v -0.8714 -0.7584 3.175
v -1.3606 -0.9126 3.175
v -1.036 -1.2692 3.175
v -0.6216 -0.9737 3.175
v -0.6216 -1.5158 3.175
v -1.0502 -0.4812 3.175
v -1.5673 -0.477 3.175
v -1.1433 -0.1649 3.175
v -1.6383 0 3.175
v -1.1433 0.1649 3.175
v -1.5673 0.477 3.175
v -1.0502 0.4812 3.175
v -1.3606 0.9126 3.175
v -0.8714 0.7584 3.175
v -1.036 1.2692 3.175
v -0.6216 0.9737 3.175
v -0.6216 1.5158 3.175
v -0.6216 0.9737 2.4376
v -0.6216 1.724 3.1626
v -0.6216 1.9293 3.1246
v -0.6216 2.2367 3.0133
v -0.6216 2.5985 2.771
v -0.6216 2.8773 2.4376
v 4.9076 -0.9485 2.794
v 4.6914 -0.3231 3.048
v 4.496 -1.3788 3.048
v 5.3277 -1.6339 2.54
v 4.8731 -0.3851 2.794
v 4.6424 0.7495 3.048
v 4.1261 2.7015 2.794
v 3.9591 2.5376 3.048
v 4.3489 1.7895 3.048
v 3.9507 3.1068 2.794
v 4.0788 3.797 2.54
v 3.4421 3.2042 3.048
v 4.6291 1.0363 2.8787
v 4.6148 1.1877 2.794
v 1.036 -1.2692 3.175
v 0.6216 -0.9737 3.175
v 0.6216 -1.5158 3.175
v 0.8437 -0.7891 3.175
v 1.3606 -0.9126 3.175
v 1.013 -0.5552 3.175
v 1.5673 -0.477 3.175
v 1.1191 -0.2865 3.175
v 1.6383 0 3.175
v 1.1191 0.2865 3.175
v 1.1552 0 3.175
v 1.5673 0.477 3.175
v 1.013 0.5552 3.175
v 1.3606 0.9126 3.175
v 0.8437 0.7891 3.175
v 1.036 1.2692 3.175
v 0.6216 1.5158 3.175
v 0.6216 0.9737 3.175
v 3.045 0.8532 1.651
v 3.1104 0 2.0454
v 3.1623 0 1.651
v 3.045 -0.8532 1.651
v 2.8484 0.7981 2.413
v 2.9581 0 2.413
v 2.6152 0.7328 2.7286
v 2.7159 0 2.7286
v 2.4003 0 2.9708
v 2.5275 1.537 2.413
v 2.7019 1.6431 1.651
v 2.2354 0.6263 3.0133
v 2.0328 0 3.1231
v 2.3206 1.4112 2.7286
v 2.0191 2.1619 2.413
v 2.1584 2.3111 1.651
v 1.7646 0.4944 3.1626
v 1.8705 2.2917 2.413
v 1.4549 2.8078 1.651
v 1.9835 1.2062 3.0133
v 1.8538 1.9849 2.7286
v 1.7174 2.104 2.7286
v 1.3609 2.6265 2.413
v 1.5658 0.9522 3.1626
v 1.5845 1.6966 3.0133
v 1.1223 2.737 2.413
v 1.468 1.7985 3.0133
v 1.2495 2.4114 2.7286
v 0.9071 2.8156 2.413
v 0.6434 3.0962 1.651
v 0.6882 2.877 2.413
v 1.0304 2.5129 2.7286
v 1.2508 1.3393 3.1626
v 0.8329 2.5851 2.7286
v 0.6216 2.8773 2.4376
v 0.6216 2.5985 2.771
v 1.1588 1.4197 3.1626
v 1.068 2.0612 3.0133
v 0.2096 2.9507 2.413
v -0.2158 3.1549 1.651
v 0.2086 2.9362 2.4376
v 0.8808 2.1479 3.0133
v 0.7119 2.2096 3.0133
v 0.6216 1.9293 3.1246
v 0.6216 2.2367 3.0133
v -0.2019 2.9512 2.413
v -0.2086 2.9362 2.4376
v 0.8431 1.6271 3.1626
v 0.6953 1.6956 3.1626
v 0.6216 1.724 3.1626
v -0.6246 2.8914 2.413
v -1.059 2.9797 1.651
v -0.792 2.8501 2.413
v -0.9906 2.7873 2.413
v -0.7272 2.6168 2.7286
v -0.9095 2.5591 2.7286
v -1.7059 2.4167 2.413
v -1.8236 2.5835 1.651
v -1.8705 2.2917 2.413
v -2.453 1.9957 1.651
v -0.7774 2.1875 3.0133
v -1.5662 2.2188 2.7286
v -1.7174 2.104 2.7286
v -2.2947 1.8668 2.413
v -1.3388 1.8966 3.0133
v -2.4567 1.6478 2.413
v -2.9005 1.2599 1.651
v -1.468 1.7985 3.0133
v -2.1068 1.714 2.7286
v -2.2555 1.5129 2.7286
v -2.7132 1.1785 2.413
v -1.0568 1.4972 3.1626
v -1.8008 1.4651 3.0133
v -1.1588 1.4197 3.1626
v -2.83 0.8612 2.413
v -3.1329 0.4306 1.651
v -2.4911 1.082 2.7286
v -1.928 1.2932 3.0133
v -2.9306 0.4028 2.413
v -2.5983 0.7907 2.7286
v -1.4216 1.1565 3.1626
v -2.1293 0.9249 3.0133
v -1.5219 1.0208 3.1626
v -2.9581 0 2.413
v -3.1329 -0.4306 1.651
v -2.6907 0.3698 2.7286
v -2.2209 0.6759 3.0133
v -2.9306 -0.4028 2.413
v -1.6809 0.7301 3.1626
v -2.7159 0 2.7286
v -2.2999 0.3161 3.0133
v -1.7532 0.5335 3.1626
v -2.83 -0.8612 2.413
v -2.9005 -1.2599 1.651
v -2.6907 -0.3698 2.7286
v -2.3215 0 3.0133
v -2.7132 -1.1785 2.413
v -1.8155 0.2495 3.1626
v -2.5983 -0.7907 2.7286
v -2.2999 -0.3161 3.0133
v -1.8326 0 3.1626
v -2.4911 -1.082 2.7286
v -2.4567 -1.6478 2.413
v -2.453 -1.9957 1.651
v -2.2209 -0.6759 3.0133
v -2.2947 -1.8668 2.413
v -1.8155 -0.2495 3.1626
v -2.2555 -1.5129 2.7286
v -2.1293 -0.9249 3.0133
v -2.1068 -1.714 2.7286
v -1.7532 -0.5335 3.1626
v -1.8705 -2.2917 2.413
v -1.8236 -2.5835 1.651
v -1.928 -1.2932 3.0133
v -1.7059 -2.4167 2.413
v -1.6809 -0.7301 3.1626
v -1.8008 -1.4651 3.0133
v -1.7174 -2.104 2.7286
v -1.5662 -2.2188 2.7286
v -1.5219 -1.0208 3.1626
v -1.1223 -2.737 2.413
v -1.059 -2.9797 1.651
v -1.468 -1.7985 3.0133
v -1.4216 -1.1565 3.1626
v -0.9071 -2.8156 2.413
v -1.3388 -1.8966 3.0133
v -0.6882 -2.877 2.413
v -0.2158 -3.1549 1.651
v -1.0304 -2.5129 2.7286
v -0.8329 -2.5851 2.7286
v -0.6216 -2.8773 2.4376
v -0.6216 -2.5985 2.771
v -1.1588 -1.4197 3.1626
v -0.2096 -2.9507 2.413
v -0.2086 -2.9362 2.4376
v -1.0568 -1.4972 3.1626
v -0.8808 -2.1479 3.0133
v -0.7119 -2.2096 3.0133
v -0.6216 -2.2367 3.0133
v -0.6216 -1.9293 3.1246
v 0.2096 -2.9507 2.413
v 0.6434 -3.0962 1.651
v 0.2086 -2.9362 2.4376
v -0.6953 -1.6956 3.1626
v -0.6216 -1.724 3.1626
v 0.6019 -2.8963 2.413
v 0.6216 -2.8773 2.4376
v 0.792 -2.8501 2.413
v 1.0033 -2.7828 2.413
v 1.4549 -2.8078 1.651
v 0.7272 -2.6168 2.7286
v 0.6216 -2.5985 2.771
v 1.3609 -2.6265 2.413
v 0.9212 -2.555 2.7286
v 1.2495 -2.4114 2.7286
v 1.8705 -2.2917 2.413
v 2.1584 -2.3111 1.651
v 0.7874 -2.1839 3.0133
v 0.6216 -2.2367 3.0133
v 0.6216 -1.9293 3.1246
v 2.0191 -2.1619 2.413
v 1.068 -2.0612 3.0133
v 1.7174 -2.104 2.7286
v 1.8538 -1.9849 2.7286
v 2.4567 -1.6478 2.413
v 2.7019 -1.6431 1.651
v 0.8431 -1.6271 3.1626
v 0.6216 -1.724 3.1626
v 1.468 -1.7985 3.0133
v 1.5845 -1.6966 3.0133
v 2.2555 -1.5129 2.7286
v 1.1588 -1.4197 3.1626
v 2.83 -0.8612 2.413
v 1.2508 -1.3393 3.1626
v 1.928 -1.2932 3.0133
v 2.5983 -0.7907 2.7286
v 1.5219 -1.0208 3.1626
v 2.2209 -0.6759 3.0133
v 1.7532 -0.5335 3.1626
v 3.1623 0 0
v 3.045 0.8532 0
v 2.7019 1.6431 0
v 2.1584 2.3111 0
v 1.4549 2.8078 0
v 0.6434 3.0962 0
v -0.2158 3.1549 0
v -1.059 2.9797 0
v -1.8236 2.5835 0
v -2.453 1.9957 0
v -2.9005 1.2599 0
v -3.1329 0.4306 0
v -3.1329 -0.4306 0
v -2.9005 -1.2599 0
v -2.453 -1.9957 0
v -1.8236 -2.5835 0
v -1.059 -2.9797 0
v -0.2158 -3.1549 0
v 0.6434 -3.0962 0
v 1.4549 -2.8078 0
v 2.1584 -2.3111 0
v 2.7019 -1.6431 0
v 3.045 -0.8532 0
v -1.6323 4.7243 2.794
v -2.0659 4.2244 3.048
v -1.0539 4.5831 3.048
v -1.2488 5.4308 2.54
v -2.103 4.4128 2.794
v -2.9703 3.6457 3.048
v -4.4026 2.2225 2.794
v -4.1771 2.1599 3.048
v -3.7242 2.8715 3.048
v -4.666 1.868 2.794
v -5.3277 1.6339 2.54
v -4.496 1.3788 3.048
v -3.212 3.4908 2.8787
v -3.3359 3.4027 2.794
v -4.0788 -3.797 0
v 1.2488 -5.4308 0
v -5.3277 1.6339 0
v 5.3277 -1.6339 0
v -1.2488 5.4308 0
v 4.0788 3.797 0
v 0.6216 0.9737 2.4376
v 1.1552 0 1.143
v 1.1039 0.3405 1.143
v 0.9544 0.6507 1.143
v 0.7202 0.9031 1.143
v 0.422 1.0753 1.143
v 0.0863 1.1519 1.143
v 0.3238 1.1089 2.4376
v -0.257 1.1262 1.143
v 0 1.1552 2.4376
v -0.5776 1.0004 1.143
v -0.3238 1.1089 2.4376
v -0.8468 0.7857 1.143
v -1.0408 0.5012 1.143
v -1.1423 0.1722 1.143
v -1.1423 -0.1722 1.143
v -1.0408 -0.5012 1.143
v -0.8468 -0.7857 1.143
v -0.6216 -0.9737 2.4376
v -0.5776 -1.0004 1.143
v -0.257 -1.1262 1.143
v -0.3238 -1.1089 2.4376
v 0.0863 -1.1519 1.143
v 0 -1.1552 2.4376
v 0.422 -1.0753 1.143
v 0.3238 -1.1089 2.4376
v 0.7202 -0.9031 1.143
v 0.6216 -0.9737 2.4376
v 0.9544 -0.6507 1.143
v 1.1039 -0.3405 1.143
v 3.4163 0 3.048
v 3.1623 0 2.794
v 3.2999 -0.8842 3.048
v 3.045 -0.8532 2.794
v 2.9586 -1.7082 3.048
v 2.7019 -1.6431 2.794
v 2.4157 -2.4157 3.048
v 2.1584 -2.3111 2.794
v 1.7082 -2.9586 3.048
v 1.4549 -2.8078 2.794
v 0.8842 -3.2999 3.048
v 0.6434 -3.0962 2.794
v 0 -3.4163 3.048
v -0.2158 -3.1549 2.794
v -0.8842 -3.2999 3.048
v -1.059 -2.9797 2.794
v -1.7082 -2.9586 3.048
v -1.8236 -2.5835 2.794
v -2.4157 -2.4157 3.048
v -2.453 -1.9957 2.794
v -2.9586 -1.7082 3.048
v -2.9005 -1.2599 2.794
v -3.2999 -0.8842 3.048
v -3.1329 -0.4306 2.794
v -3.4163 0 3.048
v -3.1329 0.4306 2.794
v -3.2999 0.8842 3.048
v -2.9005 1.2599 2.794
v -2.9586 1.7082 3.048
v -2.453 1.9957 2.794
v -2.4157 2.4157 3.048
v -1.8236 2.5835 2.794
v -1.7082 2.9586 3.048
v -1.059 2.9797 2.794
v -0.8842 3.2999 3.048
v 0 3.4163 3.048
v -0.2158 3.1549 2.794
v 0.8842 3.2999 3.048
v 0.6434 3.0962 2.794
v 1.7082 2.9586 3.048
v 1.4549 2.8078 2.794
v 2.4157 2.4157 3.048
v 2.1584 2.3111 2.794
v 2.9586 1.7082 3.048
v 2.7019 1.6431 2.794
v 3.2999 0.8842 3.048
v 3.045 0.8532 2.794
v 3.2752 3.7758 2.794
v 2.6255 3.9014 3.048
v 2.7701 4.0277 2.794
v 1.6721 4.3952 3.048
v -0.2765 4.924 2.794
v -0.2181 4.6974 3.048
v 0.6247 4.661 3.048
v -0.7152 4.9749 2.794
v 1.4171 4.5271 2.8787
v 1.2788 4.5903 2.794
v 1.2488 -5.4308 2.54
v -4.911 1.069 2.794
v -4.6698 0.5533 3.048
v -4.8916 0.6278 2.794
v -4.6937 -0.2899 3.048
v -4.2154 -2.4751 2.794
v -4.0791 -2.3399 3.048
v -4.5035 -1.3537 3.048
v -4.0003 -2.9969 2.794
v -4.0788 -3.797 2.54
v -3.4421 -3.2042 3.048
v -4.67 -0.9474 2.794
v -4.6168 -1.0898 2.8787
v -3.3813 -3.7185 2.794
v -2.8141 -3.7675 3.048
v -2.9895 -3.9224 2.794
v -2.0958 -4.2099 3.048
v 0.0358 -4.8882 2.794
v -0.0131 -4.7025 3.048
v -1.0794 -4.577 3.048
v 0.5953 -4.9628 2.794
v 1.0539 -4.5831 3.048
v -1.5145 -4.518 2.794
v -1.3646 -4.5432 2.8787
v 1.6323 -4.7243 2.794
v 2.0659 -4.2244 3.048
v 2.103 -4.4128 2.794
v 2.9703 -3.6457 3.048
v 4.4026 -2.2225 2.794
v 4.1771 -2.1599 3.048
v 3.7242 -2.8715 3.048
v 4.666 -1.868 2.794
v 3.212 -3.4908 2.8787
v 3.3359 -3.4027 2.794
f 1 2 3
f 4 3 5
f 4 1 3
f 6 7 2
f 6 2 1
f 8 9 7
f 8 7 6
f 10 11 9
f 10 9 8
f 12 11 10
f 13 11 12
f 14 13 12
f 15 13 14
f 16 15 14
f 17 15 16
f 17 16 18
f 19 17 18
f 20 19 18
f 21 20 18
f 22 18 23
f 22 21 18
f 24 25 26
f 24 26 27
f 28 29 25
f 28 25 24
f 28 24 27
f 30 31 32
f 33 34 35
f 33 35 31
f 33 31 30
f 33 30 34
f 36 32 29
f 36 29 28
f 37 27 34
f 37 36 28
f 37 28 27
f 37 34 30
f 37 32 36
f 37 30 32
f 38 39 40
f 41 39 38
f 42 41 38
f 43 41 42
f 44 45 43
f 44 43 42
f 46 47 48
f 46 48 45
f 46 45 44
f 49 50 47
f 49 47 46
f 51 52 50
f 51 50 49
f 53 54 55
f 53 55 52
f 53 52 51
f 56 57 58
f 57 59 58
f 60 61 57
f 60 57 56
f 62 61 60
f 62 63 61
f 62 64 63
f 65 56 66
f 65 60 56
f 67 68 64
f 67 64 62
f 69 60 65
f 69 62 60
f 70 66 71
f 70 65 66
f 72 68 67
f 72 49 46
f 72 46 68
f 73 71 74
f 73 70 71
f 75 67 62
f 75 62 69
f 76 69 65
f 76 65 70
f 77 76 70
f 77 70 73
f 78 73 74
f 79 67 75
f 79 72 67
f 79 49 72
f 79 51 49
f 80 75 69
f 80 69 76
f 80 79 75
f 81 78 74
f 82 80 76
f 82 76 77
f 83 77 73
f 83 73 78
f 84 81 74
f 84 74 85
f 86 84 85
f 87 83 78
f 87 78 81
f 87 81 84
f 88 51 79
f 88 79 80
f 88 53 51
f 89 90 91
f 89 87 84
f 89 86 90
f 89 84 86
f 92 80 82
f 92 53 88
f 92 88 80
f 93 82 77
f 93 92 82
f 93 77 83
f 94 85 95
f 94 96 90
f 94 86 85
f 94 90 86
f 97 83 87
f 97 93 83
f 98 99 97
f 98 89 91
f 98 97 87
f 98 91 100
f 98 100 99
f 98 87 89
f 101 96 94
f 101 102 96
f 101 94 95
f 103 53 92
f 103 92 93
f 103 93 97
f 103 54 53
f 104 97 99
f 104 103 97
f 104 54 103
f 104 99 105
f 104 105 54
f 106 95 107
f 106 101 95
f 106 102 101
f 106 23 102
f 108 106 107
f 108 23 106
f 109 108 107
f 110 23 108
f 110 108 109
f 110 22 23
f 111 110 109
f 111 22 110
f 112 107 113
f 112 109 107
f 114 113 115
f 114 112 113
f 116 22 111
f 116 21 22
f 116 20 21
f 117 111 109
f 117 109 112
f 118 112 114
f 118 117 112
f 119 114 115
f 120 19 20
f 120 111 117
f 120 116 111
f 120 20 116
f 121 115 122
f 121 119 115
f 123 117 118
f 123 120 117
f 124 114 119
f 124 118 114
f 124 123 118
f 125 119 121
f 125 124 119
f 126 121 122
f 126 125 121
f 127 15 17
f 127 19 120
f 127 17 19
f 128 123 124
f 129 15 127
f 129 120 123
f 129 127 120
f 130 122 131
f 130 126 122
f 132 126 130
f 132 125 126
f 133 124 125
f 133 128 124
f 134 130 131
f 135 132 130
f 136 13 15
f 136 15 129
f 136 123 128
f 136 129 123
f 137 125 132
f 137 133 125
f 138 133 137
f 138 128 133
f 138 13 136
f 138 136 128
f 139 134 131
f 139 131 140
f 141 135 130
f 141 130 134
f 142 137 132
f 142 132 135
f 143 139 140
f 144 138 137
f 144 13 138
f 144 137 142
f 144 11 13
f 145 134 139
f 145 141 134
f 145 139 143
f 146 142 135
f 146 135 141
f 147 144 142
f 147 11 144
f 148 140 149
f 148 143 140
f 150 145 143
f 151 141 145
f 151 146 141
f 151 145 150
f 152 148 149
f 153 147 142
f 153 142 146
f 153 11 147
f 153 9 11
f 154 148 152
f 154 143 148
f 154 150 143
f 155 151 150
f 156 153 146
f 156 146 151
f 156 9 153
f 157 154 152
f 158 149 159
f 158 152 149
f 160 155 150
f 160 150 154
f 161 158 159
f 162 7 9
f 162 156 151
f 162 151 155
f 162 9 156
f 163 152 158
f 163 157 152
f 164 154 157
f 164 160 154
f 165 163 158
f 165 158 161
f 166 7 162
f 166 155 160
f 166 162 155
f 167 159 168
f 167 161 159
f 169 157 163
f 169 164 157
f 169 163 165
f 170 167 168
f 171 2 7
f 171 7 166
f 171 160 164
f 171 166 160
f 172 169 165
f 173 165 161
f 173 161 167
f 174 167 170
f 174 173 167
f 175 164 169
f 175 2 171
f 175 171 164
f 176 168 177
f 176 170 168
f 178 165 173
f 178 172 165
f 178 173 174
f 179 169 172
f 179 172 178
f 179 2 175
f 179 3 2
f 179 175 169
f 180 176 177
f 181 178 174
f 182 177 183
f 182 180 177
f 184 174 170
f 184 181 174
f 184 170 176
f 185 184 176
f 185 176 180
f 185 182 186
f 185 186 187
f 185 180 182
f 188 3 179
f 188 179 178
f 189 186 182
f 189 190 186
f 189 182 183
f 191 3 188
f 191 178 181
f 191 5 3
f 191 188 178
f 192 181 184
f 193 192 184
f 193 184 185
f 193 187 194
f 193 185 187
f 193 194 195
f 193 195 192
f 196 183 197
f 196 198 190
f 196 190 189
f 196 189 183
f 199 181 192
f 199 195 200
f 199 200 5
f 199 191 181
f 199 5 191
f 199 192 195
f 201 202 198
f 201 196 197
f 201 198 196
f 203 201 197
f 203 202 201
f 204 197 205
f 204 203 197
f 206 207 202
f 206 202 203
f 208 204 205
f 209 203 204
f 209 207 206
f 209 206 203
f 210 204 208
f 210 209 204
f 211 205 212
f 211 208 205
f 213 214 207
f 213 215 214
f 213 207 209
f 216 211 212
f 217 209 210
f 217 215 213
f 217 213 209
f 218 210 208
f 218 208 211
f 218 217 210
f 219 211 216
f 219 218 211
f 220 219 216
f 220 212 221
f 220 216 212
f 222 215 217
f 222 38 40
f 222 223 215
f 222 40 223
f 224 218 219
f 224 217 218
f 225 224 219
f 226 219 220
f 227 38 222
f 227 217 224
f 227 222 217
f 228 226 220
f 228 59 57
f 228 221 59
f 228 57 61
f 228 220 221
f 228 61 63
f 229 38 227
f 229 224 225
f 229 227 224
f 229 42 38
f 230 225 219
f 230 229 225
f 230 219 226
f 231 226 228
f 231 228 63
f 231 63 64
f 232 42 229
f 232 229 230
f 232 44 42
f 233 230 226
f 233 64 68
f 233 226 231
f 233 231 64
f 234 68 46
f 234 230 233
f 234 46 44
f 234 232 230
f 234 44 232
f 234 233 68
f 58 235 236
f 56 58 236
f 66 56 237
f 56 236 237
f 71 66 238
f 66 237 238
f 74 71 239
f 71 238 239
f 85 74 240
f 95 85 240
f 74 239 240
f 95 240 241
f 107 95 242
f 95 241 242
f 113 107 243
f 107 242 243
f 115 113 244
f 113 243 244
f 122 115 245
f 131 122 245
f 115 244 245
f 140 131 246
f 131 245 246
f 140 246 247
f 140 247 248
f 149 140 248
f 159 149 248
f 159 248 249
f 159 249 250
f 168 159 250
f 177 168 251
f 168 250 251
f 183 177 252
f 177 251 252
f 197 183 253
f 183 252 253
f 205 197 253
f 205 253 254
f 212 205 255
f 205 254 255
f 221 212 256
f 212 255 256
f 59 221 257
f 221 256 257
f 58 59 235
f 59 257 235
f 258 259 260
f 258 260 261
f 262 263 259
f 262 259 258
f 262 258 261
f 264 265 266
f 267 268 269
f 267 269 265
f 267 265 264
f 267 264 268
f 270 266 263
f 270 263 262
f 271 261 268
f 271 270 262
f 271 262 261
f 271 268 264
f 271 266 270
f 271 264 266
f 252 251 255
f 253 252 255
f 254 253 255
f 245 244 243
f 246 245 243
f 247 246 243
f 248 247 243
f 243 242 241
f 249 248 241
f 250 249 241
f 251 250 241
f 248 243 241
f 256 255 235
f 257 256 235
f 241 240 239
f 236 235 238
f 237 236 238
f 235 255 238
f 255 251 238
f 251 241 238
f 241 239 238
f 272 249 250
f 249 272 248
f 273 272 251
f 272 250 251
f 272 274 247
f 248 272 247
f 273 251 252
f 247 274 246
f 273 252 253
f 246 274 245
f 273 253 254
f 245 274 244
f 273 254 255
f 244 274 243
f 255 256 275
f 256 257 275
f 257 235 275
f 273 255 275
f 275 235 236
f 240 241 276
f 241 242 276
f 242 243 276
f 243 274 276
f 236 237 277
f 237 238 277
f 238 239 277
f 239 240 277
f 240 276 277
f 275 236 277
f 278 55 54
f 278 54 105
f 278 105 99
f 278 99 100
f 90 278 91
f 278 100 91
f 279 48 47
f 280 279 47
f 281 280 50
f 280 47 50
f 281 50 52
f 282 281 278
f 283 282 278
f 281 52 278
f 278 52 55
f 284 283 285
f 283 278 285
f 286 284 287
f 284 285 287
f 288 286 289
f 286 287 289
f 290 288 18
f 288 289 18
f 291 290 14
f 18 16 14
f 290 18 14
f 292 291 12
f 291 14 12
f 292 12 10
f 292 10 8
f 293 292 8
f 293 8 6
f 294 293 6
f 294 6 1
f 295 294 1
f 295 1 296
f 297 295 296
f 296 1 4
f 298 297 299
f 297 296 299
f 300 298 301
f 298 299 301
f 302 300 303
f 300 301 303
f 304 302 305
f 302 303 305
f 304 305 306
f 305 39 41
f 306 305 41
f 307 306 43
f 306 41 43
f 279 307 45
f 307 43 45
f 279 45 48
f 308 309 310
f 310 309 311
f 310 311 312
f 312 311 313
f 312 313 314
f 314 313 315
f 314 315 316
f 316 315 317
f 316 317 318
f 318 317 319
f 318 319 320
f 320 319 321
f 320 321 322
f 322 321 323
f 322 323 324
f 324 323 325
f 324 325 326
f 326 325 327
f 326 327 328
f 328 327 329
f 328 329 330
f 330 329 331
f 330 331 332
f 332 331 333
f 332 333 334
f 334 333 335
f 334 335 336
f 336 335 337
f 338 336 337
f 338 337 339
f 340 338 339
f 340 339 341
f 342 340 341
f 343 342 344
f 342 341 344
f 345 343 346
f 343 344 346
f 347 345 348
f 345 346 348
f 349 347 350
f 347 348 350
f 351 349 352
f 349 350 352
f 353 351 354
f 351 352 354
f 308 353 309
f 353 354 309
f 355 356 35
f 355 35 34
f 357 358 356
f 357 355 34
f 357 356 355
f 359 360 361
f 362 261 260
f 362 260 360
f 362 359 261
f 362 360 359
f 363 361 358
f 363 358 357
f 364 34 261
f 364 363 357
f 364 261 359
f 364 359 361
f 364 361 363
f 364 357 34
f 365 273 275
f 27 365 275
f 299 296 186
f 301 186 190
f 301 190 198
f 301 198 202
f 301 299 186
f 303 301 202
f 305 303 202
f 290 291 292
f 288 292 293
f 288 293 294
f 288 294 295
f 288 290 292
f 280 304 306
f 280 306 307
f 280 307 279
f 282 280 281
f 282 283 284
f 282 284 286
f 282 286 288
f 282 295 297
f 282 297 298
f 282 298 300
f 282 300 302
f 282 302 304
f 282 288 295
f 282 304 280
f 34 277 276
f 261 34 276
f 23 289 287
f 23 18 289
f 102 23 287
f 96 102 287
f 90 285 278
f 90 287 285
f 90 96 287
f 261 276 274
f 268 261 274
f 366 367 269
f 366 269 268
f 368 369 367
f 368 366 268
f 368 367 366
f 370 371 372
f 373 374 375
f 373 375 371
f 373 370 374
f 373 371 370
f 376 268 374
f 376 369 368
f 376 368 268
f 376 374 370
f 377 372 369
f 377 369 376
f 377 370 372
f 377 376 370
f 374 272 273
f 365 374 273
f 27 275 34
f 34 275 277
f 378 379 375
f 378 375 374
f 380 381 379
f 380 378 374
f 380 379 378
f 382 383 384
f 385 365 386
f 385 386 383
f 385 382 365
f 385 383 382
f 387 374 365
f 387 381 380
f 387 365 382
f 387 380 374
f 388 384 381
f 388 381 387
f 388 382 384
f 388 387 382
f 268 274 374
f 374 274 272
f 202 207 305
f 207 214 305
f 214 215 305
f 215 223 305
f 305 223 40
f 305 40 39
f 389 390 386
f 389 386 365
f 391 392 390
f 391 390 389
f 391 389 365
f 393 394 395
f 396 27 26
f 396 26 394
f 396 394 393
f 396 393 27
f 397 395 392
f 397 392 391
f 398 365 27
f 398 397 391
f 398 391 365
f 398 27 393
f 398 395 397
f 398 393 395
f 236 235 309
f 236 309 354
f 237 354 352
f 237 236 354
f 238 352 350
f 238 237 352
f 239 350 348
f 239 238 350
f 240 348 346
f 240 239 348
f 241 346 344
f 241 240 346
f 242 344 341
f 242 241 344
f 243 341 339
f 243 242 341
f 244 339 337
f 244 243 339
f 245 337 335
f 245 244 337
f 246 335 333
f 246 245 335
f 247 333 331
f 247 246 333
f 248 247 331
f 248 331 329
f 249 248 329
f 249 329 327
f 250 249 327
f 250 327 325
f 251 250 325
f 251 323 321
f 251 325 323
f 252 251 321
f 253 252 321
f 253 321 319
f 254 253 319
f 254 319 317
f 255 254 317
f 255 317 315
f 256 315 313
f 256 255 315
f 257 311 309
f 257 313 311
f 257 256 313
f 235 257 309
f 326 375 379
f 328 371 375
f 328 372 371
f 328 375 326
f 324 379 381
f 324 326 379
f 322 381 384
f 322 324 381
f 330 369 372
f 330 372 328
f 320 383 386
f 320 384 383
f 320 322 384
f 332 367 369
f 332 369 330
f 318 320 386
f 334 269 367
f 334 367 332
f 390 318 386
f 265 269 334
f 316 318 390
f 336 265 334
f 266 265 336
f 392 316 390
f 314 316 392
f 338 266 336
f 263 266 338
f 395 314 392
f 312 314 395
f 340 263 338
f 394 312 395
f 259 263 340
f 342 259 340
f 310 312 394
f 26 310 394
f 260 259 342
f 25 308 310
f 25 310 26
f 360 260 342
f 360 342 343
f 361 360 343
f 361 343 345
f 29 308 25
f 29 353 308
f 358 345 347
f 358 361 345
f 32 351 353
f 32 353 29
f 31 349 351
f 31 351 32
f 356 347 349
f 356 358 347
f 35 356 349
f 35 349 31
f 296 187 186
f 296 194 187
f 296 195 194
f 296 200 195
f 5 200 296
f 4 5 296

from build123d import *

# Parameters (mm, degrees)
F3_DEPTH  = 2.54
F1_R      = 4.7026824454
F4_DEPTH  = 3.048
F2_R      = 3.1623160727
F6_DEPTH  = 5.08
F7_SIZE   = 0.254
F8_DEPTH  = 3.175
F9_R      = 1.524
F10_W     = 1.2431591749
F10_H     = 6.996748969
F11_DEPTH = 0.7374347188
F12_R     = 1.1551720175
F13_DEPTH = 2.032


# Not quite as in the source:
# - the arcs of a loft's sections are written as splines that run evenly, so that the points pair up as in the source's solid


with BuildPart() as f3:
    # F0 (on Top) → F3 (new body)
    with BuildSketch(Plane.XY):
        Polygon((1.2488487713, -5.4308450613), (5.3276741728, -1.6338877692), (4.0788254014, 3.7969572921), (-1.2488487713, 5.4308450613), (-5.3276741728, 1.6338877692), (-4.0788254014, -3.7969572921), align=None)
    extrude(amount=F3_DEPTH)



with BuildPart() as f4:
    # F1 (on Top) → F4 (new body)
    with BuildSketch(Plane.XY):
        Circle(F1_R)
    extrude(amount=F4_DEPTH)


with BuildPart() as f3_1:
    add(f3.part)

    add(f4.part)  # F5 merges F4
    # F3_face (on face) → F5 section 0
    with BuildSketch(Plane.XY.offset(2.54)):
        Polygon((-5.3276741728, 1.6338877692), (-4.0788254014, -3.7969572921), (1.2488487713, -5.4308450613), (5.3276741728, -1.6338877692), (4.0788254014, 3.7969572921), (-1.2488487713, 5.4308450613), align=None)
    # F4_face (on face) → F5 section 1
    with BuildSketch(Plane.XY.offset(3.048)):
        with BuildLine():
            add(Edge.make_bspline(
                [(-4.4960033295, 1.3788314773), (-4.6564376569, 0.8556977355), (-4.7246126151, 0.30441075), (-4.6682859675, -0.7885026272), (-4.5437982188, -1.3298601483), (-4.1170700938, -2.3375979359), (-3.814934698, -2.8037302861), (-3.4421047517, -3.2042373602)],
                knots=[0, 0, 0, 0, 0.3333333333, 0.3333333333, 0.6666666667, 0.6666666667, 1, 1, 1, 1], degree=3))
            add(Edge.make_bspline(
                [(-3.4421047517, -3.2042373602), (-3.0692748053, -3.6047444343), (-2.6259337502, -3.9394291727), (-1.6512796777, -4.4371055536), (-1.1202064375, -4.5999747613), (-0.0341158506, -4.7342862584), (0.5206343041, -4.7056955053), (1.0538985779, -4.5830688375)],
                knots=[0, 0, 0, 0, 0.3333333333, 0.3333333333, 0.6666666667, 0.6666666667, 1, 1, 1, 1], degree=3))
            add(Edge.make_bspline(
                [(1.0538985779, -4.5830688375), (1.5871628516, -4.4604421698), (2.0986788649, -4.2438399227), (3.0170062898, -3.6486029264), (3.4235917813, -3.270114613), (4.0829542432, -2.3966883224), (4.3355690021, -1.9019652192), (4.4960033295, -1.3788314773)],
                knots=[0, 0, 0, 0, 0.3333333333, 0.3333333333, 0.6666666667, 0.6666666667, 1, 1, 1, 1], degree=3))
            add(Edge.make_bspline(
                [(4.4960033295, -1.3788314773), (4.6564376569, -0.8556977355), (4.7246126151, -0.30441075), (4.6682859675, 0.7885026272), (4.5437982188, 1.3298601483), (4.1170700938, 2.3375979359), (3.814934698, 2.8037302861), (3.4421047517, 3.2042373602)],
                knots=[0, 0, 0, 0, 0.3333333333, 0.3333333333, 0.6666666667, 0.6666666667, 1, 1, 1, 1], degree=3))
            add(Edge.make_bspline(
                [(3.4421047517, 3.2042373602), (3.0692748053, 3.6047444343), (2.6259337502, 3.9394291727), (1.6512796777, 4.4371055536), (1.1202064375, 4.5999747613), (0.0341158506, 4.7342862584), (-0.5206343041, 4.7056955053), (-1.0538985779, 4.5830688375)],
                knots=[0, 0, 0, 0, 0.3333333333, 0.3333333333, 0.6666666667, 0.6666666667, 1, 1, 1, 1], degree=3))
            add(Edge.make_bspline(
                [(-1.0538985779, 4.5830688375), (-1.5871628516, 4.4604421698), (-2.0986788649, 4.2438399227), (-3.0170062898, 3.6486029264), (-3.4235917813, 3.270114613), (-4.0829542432, 2.3966883224), (-4.3355690021, 1.9019652192), (-4.4960033295, 1.3788314773)],
                knots=[0, 0, 0, 0, 0.3333333333, 0.3333333333, 0.6666666667, 0.6666666667, 1, 1, 1, 1], degree=3))
        make_face()
    loft(ruled=True)

    # F2 (on Top) → F6 (cut)
    with BuildSketch(Plane.XY):
        Circle(F2_R)
    extrude(amount=F6_DEPTH, mode=Mode.SUBTRACT)

    # F7
    f7_edges = [f3_1.edges().sort_by_distance(p)[0] for p in [
        (-3.162316, 0, 3.048),
    ]]
    chamfer(f7_edges, length=F7_SIZE)


with BuildPart() as f8:
    # F2 (on Top) → F8 (new body)
    with BuildSketch(Plane.XY):
        Circle(F2_R)
    extrude(amount=F8_DEPTH)

    # F9
    f9_edges = [f8.edges().sort_by_distance(p)[0] for p in [
        (-3.162316, 0, 3.175),
    ]]
    fillet(f9_edges, radius=F9_R)

    # F10 (on face) → F11 (cut)
    with BuildSketch(Plane.XY.offset(3.175)):
        Rectangle(F10_W, F10_H)
    extrude(amount=-F11_DEPTH, mode=Mode.SUBTRACT)

    # F12 (on face) → F13 (cut)
    with BuildSketch(Plane.XY.offset(3.175)):
        Circle(F12_R)
    extrude(amount=-F13_DEPTH, mode=Mode.SUBTRACT)


solid = Compound([f3_1.part, f8.part])
